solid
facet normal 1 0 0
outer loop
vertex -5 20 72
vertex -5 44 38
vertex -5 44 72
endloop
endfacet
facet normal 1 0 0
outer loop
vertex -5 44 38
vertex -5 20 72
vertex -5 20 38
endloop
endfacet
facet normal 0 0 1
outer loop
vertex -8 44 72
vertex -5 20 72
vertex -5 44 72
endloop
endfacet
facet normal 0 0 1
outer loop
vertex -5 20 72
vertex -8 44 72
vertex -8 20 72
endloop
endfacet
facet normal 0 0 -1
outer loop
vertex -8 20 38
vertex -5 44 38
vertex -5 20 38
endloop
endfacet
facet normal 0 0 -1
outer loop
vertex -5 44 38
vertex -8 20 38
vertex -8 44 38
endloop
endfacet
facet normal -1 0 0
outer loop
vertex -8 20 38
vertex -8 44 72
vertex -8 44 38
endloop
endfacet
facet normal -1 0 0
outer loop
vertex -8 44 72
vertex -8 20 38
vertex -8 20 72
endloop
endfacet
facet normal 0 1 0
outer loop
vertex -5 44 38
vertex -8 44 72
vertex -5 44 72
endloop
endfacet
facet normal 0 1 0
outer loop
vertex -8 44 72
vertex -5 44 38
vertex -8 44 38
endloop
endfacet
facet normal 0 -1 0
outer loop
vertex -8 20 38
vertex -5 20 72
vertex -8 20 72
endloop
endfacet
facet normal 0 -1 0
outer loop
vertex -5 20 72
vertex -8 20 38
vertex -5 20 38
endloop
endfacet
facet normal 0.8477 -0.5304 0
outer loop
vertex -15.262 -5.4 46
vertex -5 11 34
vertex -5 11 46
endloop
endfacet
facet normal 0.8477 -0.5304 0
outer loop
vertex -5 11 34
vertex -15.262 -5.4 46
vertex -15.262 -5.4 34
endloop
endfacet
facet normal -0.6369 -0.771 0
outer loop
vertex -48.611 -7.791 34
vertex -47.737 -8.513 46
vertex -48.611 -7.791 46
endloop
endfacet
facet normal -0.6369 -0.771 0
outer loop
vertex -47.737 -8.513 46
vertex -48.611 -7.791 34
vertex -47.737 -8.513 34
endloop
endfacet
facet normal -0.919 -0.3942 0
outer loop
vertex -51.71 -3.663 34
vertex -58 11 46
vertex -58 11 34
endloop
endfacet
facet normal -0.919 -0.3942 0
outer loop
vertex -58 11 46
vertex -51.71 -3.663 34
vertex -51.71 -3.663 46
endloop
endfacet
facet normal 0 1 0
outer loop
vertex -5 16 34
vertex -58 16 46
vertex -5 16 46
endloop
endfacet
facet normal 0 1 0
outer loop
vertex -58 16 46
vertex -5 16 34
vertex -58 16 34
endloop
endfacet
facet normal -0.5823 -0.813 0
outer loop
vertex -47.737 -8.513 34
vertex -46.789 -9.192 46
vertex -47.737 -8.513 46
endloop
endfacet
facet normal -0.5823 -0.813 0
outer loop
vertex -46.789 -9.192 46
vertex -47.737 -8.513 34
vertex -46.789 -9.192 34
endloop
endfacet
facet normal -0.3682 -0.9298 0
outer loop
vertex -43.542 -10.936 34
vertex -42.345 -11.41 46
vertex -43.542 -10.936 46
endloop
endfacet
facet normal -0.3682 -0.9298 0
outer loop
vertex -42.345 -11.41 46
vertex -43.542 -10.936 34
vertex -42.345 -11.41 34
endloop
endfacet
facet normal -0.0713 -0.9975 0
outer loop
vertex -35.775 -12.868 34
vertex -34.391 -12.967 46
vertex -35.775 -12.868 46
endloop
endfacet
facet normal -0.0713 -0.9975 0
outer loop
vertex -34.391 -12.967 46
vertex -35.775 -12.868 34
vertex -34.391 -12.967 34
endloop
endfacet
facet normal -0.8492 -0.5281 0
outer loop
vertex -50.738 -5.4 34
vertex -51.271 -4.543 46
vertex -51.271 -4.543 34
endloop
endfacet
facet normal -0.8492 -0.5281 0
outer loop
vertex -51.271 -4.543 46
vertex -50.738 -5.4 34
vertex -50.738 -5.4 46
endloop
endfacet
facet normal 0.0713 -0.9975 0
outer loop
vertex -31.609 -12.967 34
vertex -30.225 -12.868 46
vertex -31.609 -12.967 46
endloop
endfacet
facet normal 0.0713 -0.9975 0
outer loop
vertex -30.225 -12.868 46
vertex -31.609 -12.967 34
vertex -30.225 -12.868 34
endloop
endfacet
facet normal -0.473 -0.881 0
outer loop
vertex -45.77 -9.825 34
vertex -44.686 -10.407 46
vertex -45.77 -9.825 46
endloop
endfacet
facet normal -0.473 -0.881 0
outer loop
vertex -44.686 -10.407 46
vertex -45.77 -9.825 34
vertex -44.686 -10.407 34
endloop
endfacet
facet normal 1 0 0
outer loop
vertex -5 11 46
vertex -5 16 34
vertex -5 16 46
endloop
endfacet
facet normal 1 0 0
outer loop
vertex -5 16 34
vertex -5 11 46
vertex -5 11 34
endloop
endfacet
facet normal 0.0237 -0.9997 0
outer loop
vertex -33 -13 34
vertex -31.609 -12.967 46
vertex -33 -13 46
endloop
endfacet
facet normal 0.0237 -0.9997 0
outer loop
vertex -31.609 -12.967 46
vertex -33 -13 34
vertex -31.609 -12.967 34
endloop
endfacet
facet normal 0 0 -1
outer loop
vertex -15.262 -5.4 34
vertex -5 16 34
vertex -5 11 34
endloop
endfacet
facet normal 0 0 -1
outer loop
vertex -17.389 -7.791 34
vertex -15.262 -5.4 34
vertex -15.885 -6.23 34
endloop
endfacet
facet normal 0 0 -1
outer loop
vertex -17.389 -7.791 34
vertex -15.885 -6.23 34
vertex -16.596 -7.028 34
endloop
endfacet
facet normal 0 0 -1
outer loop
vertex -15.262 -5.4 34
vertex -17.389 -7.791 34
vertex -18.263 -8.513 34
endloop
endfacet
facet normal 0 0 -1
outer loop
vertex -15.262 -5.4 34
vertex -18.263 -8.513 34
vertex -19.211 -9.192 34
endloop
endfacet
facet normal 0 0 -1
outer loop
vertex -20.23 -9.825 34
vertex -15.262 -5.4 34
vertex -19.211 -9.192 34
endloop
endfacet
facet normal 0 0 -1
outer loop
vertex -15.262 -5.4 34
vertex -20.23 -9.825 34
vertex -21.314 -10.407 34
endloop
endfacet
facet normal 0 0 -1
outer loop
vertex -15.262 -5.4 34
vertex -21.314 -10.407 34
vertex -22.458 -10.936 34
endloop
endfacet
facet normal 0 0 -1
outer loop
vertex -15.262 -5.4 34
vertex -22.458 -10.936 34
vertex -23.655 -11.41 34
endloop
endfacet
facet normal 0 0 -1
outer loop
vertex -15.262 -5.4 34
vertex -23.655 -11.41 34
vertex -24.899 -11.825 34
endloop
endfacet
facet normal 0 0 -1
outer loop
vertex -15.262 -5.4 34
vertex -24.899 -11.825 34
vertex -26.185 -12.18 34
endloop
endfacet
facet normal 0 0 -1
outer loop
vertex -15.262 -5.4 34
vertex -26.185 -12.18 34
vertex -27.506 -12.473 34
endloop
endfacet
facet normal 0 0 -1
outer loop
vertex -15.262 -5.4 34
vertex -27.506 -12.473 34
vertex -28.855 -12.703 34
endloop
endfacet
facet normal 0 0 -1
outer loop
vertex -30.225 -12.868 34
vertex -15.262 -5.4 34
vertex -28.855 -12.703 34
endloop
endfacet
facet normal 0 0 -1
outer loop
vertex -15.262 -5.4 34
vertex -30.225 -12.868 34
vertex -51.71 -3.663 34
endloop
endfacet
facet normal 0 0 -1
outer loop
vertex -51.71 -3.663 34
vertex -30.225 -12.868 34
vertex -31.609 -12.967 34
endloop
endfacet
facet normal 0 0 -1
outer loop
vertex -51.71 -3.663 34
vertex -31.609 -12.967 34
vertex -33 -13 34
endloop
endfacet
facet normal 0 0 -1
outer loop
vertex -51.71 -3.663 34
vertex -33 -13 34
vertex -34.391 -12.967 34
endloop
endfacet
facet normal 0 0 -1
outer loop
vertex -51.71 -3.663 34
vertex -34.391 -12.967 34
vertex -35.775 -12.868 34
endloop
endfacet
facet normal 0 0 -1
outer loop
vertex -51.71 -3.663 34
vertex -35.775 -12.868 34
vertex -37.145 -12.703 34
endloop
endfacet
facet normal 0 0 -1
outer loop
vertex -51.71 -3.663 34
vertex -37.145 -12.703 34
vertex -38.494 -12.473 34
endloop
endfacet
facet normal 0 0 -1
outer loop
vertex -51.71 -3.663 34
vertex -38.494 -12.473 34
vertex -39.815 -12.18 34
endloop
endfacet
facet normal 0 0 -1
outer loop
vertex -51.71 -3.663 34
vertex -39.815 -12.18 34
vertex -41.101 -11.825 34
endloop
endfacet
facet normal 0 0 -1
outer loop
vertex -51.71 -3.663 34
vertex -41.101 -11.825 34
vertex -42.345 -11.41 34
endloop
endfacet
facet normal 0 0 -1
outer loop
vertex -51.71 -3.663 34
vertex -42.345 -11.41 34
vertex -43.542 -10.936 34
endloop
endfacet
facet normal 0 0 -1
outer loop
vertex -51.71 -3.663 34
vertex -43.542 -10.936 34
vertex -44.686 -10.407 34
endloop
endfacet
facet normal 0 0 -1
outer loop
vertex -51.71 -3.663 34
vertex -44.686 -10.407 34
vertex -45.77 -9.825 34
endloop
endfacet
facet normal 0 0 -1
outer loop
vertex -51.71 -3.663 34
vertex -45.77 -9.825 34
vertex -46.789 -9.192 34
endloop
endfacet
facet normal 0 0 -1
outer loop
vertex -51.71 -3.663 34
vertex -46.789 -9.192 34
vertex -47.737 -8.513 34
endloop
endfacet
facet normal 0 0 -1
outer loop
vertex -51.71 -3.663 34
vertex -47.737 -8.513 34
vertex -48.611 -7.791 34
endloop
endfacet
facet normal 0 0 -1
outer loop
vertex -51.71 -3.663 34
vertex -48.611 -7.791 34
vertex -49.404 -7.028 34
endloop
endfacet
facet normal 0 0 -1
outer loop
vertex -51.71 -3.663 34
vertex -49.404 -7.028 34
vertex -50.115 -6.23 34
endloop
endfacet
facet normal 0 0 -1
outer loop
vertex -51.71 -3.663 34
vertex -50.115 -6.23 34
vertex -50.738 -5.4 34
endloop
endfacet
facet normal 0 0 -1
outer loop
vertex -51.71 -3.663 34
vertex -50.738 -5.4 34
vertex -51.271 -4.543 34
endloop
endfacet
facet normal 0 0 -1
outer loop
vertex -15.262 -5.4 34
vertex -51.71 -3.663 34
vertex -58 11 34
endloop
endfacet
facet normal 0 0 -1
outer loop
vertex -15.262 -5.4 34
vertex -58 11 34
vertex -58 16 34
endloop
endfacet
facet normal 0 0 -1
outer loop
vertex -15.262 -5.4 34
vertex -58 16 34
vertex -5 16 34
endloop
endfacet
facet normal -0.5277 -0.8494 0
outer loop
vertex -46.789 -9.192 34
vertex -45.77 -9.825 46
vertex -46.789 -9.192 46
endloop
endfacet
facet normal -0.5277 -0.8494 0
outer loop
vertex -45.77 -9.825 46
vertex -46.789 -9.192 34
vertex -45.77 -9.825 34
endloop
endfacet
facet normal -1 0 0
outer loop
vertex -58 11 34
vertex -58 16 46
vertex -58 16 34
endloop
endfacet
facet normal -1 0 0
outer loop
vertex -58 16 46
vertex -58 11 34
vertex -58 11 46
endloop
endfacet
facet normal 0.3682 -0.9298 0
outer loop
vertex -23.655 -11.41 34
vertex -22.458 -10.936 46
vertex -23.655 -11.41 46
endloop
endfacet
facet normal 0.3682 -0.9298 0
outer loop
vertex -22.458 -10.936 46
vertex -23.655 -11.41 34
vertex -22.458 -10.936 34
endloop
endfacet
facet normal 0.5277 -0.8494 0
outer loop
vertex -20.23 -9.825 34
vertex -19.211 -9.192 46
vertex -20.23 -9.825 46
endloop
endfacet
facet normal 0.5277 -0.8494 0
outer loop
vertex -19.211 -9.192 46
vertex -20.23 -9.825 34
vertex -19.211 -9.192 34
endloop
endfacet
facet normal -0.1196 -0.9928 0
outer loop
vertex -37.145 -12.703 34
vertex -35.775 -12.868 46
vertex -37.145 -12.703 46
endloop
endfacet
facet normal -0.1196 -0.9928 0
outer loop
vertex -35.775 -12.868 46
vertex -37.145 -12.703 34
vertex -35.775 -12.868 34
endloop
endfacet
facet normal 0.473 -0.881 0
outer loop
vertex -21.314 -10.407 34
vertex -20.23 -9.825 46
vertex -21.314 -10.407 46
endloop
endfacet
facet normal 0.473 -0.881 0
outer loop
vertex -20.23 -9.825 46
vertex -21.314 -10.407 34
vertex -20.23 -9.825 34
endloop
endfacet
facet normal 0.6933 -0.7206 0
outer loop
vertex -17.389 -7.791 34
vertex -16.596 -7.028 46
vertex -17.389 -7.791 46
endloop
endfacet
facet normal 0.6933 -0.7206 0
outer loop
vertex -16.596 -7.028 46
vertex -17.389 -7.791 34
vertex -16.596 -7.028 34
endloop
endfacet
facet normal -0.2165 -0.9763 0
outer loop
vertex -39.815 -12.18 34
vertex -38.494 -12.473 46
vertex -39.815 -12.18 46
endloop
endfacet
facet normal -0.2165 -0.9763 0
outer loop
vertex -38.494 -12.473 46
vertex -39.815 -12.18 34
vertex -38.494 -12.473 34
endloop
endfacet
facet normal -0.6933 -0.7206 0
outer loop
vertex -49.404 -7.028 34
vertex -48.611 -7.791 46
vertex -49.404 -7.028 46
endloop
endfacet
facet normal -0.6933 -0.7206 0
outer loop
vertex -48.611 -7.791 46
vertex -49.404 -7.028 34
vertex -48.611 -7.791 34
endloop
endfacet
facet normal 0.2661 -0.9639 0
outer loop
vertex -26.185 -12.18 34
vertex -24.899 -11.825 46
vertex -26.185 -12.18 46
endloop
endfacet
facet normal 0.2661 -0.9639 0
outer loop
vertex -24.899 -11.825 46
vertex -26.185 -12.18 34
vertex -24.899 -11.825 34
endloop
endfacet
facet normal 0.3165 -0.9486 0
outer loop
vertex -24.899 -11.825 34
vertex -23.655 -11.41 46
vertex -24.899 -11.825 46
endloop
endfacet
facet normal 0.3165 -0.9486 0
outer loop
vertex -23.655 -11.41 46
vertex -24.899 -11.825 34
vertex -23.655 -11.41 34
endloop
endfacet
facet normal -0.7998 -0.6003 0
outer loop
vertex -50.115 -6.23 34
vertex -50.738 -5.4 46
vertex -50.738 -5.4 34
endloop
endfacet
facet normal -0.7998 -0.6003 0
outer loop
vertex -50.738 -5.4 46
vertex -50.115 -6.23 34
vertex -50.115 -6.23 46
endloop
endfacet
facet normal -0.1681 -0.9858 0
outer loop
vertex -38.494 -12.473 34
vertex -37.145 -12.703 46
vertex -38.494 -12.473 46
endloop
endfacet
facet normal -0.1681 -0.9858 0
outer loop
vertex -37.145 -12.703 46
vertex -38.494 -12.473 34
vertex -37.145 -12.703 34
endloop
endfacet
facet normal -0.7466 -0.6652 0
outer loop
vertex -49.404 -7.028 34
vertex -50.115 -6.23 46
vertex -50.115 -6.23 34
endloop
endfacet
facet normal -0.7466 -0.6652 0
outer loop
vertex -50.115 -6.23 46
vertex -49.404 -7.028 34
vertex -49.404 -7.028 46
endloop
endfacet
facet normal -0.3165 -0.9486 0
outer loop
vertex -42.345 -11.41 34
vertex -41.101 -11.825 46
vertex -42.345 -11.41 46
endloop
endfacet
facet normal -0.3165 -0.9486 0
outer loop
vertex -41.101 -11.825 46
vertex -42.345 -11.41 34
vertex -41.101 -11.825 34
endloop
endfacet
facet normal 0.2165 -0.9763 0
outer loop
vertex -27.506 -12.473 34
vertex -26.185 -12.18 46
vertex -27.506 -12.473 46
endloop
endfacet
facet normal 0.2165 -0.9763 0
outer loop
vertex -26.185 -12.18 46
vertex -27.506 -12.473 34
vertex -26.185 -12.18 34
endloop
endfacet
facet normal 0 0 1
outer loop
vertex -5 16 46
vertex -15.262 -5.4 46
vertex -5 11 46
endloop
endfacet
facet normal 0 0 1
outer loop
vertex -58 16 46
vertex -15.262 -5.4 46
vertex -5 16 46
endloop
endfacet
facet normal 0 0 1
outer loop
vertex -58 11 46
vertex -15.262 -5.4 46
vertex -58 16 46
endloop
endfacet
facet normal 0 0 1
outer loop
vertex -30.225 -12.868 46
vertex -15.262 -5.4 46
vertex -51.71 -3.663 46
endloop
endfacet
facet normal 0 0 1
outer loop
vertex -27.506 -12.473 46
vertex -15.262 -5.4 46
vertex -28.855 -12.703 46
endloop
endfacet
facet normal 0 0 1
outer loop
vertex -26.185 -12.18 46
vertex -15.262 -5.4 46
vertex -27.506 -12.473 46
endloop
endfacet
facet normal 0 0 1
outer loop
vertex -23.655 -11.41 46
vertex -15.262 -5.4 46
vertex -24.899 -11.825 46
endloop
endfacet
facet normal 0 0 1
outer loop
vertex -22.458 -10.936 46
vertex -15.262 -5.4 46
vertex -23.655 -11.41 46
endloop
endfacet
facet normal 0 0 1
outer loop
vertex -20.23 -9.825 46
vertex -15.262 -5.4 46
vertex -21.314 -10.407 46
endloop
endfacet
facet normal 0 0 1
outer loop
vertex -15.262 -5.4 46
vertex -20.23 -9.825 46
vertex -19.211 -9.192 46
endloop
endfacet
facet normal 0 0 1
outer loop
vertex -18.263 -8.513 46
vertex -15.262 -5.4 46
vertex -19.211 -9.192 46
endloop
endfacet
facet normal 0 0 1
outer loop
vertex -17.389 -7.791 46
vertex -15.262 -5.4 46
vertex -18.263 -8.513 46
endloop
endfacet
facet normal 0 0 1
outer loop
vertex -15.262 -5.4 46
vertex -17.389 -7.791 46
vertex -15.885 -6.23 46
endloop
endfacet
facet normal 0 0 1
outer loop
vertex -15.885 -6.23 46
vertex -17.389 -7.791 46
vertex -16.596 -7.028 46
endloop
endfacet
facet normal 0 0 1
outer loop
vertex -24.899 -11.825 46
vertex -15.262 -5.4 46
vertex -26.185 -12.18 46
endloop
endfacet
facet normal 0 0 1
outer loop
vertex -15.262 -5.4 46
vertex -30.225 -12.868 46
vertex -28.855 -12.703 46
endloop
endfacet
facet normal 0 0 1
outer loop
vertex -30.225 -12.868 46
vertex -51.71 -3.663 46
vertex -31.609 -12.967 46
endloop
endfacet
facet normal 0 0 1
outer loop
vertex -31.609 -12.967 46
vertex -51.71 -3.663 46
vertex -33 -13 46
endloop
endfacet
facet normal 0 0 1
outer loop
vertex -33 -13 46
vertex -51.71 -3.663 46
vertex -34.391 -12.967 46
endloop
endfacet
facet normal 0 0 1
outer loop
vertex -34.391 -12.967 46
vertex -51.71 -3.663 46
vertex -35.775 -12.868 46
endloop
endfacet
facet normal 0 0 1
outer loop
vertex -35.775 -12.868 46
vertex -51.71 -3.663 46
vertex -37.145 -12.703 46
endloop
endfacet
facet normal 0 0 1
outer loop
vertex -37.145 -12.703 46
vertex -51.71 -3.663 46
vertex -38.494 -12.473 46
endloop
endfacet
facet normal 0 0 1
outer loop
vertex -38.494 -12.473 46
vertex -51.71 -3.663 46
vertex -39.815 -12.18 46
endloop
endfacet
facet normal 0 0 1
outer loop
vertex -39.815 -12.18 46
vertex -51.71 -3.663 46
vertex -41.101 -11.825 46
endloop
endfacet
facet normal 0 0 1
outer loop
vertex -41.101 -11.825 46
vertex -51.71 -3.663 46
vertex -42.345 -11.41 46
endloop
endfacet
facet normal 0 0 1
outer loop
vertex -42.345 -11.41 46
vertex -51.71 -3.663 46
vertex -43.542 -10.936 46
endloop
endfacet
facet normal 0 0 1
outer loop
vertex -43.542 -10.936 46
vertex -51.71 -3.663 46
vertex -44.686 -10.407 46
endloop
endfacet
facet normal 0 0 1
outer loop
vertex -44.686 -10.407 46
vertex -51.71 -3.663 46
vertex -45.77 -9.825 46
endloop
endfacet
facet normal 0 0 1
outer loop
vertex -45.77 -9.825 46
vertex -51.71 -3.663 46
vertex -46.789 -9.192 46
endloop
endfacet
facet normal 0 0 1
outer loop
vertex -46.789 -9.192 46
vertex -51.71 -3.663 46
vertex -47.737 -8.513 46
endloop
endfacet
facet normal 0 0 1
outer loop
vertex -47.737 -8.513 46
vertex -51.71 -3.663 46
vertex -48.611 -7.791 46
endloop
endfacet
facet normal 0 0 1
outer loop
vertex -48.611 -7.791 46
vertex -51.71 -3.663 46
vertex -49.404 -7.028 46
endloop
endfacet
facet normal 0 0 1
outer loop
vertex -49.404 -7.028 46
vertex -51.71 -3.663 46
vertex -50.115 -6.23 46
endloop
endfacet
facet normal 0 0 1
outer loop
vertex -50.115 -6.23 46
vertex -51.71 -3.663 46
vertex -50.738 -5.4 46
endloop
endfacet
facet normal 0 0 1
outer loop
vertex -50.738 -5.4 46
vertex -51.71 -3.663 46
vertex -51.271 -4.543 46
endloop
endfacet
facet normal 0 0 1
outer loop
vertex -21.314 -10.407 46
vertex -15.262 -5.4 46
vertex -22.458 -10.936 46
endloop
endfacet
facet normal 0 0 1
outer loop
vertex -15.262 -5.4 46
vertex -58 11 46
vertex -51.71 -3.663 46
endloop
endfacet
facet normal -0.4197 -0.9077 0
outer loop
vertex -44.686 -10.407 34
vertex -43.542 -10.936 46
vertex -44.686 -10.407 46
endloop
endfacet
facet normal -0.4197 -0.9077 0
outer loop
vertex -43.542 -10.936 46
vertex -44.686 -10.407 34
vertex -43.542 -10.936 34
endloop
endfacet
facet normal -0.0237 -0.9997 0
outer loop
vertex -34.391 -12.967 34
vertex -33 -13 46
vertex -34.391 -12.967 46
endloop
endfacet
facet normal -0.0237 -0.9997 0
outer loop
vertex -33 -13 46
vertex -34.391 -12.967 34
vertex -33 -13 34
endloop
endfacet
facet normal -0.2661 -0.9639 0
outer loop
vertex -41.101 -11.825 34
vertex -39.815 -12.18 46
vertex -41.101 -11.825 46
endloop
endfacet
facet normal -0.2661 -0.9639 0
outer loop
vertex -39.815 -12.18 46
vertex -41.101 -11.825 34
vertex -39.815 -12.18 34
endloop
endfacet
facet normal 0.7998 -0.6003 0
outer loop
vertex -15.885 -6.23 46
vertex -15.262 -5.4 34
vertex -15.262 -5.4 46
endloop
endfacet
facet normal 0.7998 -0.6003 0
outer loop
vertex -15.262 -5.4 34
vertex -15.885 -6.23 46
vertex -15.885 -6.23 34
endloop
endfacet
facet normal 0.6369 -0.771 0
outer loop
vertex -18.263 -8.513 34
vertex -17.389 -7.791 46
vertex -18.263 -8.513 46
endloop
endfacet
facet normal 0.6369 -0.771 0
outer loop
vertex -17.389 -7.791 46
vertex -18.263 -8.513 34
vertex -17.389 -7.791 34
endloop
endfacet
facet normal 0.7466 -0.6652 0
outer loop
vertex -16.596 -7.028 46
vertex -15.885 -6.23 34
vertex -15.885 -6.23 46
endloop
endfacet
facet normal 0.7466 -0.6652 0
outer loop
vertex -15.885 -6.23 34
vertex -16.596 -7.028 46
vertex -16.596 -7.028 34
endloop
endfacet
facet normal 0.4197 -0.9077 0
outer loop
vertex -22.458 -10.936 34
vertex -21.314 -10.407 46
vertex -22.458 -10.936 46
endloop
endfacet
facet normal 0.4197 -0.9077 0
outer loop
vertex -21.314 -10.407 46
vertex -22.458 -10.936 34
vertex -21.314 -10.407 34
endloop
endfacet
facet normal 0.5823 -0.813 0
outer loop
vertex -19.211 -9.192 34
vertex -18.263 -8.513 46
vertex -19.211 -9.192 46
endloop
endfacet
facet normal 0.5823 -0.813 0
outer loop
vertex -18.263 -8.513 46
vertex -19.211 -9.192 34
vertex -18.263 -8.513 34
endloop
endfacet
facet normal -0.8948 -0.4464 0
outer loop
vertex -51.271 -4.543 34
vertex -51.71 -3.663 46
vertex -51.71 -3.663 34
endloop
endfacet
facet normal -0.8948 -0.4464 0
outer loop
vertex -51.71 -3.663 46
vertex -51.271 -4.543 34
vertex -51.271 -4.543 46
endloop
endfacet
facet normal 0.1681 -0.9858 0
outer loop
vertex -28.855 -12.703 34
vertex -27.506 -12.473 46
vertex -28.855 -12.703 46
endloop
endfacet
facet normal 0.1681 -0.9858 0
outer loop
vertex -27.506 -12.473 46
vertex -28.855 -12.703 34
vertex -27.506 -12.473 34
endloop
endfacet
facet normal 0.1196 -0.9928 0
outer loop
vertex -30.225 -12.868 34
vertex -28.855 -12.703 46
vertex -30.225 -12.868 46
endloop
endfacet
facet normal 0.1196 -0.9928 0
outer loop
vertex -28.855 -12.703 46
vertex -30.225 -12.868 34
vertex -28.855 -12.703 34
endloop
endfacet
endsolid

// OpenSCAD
// file: rounder.scad
// rounder.scad
// cutting tool for rounding off corners with a cylinder

//---------------------
module rounder(
r=10,   // radius
h=10,   // height
f=22,    // $fn
extra=0.01  // extra size for the cube
){

difference(){
  translate([-extra,-extra,-extra])
  cube([r+extra,r+extra,h+2*extra]);
  translate([r,r,-1])
  cylinder(r=r,h=h+2,$fn=f);
}

}

//========================

rounder();

//========================
// file: tslot.scad
// tslot
// models for tslots used in PrusaDusa

//---------------------------------------
module tslot1(
tol = 0.0,
len = 60,
type = 1
){
    
// 30x30     
if(type==1){
    linear_extrude(height=len,convexity=10)
    difference(){
        offset(r=2.0+tol,$fn=20)
        square([26,26],center=true);
 
        translate([0,12,0])
        square([8.2-tol,8.2-tol],center=true);
        translate([0,-12,0])
        square([8.2-tol,8.2-tol],center=true);
        translate([12,0,0])
        square([8.2-tol,8.2-tol],center=true);
        translate([-12,0,0])
        square([8.2-tol,8.2-tol],center=true);
    }
}
    
// 30x60
if(type==2){
    linear_extrude(height=len,convexity=10)
    difference(){
        offset(r=2.0+tol,$fn=20)
        square([26,56],center=true);
 
        translate([0,27,0])
        square([8.2-tol,8.2-tol],center=true);
        translate([0,-27,0])
        square([8.2-tol,8.2-tol],center=true);
        
        translate([12,15,0])
        square([8.2-tol,8.2-tol],center=true);
        translate([-12,15,0])
        square([8.2-tol,8.2-tol],center=true);

        translate([12,-15,0])
        square([8.2-tol,8.2-tol],center=true);
        translate([-12,-15,0])
        square([8.2-tol,8.2-tol],center=true);
    }
}
    
// 36x60
if(type==3){
    linear_extrude(height=len,convexity=10)
    difference(){
        offset(r=2.0+tol,$fn=20)
        square([56,56],center=true);
 
        translate([15,27,0])
        square([8.2-tol,8.2-tol],center=true);
        translate([15,-27,0])
        square([8.2-tol,8.2-tol],center=true);
        
        translate([-15,27,0])
        square([8.2-tol,8.2-tol],center=true);
        translate([-15,-27,0])
        square([8.2-tol,8.2-tol],center=true);
        
        translate([27,15,0])
        square([8.2-tol,8.2-tol],center=true);
        translate([-27,15,0])
        square([8.2-tol,8.2-tol],center=true);

        translate([27,-15,0])
        square([8.2-tol,8.2-tol],center=true);
        translate([-27,-15,0])
        square([8.2-tol,8.2-tol],center=true);
    }
}
    
}

//--------------------------------------
module tbrace(
tol=0.0
){

F2=22;
 
translate([0,0,2-15])    
difference(){    
union(){
        cube([4.8,60,26]);
        cube([60,4.8,26]);
    
    hull(){
        translate([60-2.4,4.8,0])
        cylinder(r=2.4,h=26,$fn=F2);
        translate([4.8,60-2.4,0])
        cylinder(r=2.4,h=26,$fn=F2);
    }
}    

        translate([15,0,26/2])
        rotate([-90,0,0])
        cylinder(r1=3.5,r2=4.5,h=60,$fn=F2);
        translate([15+30,0,26/2])
        rotate([-90,0,0])
        cylinder(r1=3.5,r2=4.5,h=60,$fn=F2);

        translate([0,15,26/2])
        rotate([0,90,0])
        cylinder(r1=3.5,r2=4.5,h=60,$fn=F2);
        translate([0,15+30,26/2])
        rotate([0,90,0])
        cylinder(r1=3.5,r2=4.5,h=60,$fn=F2);

}
}

//----------------------------------------
module lbrace(
tol=0,
holes=1,
nuts=1
){

F2=22;
    
pts1=[ [5,0], [80,0], [85,5], [85,22], [80,28],
    [28,28], [28,80], [22,85], [5,85], [0,80], [0,5] ];
    
    if(holes==1){
    difference(){
        linear_extrude(height=3.25,convexity=10)
        polygon(points=pts1);
        
        translate([16+30,14,-1])
        cylinder(r=3.25,h=5,$fn=F2);
        translate([16+60,14,-1])
        cylinder(r=3.25,h=5,$fn=F2);

        translate([14,16+30,-1])
        cylinder(r=3.25,h=5,$fn=F2);
        translate([14,16+60,-1])
        cylinder(r=3.25,h=5,$fn=F2);
    }
}else{
        linear_extrude(height=3.25,convexity=10)
        polygon(points=pts1);
}

if(nuts==1){
    
        translate([16+30,14,0])
        cylinder(r=5,h=6+3.25,$fn=F2);
        translate([16+60,14,0])
        cylinder(r=5,h=6+3.25,$fn=F2);

        translate([14,16+30,0])
        cylinder(r=5,h=6+3.25,$fn=F2);
        translate([14,16+60,0])
        cylinder(r=5,h=6+3.25,$fn=F2);
}

}


//=======================================

lbrace();

//tbrace();

/*
color("cyan")
tslot1(len=70);

color("green")
translate([0,15,0])
tslot1(type=2);

color("red")
translate([15,15,0])
tslot1(type=3,len=50);

*/

//=======================================
// main file
// acin.scad
// Delta AC input, with switch, fuse, and EMI line filter
// 115V/6A, 250V/4A, PN 06AR2D

use <tslot.scad>
use <rounder.scad>

//---------------------------------------------------------
module acin(tol=0,cut=0){
translate([-tol/2,-tol/2,-tol/2])


difference(){
  union(){
    // body
    cube([44+tol,26.8+tol,65+tol]);
    // front plate
    translate([ 44, -(29-26.8)/2, -(67.35-65)/2 ])
    cube([3+tol,29+tol,67.35+tol]);
  }
  if(cut==0){
    translate([ 47-18, 6, 5 ])
    cube([18.7,16.5,24.5]);
  }
}
  
// switch
translate([ 42, 3, 48 ])
rotate([0,0,30])
cube([13,15,11]);

// ground tab
translate([ -12, 10, 63 ])
cube([12,6.3,1]);

// line tab
translate([ -12, 5.5, 49 ])
cube([12,1,6.3]);

// neutral tab
translate([ -12, 26-5.5, 49 ])
cube([12,1,6.3]);

}

//--------------------------------------
module acbox(){
  
  difference(){
    translate([-58,15.1,34])
    cube([53,33,50]);

    translate([-60,14,57])
    rotate([0,-23,0])
    cube([65,40,30]);

    translate([-60,14,78])
    cube([65,40,30]);

    translate([-55,18,36])
    acin(tol=0.15,cut=1);

    translate([-9,20,38])   // for support
    cube([5,24,34]);
    
    translate([-22,32,30])
    cylinder(r=9,h=10,$fn=22);

    translate([-44,32,30])
    cylinder(r=9,h=10,$fn=22);

    translate([-24,50,52])
    rotate([90,0,0])
    cylinder(r=10,h=10,$fn=22);

    translate([-45,50,49])
    rotate([90,0,0])
    cylinder(r=7,h=10,$fn=22);

    translate([-60,32,46])
    rotate([0,90,0])
    cylinder(r=6,h=10,$fn=22);

  }


    difference(){
      color("pink")
      translate([-58,11.0,50.2-2])
      cube([53,5,6]);

      color("gray")
      translate([-59,11.0,52-2.5])
      rotate([45,0,0])
      cube([55,7,6]);
    }
    
    color("cyan")
    difference(){
      hull(){
        translate([-58,11,44.5])
        cube([53,5,5]);
        translate([-33,0,44.5])
        scale([1.5,1,1])
        cylinder(r=13,h=5,$fn=88);
      }

      // back rail
      color("gray")
      translate([-200,0,15])
      rotate([90,0,90])
      tslot1(type=2,len=200,tol=0.15);
      
      // tslot mounts
      translate([-33,0,40])
      cylinder(r=5.9/2,h=20,$fn=22);

    }
}

//===============================
//acbox();

// support for the bar above the plug
if(1){
color("pink")
translate([-8,20,38])   // for support
cube([3,24,34]);

      hull(){
        translate([-58,11,34])
        cube([53,5,12]);
        translate([-33,0,34])
        scale([1.5,1,1])
        cylinder(r=13,h=12,$fn=88);
      }
}

if(0){
color("orange")
translate([-55,18,36])
acin();
}

if(0){
    // back rail
    color("gray")
    translate([-200,0,15])
    rotate([90,0,90])
    tslot1(type=2,len=200);

    // left rail
    color("green")
    translate([-30,15,0])
    rotate([0,90,90])
    tslot1(type=2,len=150);

    // left tower corner 1
    color("gray")
    translate([-15,60+25+15,15])
    rotate([90,0,-90])
    tbrace();
    
    // left tower corner 2
    color("gray")
    translate([-45,60+25+15,15])
    rotate([90,0,-90])
    tbrace();
}

//===============================
